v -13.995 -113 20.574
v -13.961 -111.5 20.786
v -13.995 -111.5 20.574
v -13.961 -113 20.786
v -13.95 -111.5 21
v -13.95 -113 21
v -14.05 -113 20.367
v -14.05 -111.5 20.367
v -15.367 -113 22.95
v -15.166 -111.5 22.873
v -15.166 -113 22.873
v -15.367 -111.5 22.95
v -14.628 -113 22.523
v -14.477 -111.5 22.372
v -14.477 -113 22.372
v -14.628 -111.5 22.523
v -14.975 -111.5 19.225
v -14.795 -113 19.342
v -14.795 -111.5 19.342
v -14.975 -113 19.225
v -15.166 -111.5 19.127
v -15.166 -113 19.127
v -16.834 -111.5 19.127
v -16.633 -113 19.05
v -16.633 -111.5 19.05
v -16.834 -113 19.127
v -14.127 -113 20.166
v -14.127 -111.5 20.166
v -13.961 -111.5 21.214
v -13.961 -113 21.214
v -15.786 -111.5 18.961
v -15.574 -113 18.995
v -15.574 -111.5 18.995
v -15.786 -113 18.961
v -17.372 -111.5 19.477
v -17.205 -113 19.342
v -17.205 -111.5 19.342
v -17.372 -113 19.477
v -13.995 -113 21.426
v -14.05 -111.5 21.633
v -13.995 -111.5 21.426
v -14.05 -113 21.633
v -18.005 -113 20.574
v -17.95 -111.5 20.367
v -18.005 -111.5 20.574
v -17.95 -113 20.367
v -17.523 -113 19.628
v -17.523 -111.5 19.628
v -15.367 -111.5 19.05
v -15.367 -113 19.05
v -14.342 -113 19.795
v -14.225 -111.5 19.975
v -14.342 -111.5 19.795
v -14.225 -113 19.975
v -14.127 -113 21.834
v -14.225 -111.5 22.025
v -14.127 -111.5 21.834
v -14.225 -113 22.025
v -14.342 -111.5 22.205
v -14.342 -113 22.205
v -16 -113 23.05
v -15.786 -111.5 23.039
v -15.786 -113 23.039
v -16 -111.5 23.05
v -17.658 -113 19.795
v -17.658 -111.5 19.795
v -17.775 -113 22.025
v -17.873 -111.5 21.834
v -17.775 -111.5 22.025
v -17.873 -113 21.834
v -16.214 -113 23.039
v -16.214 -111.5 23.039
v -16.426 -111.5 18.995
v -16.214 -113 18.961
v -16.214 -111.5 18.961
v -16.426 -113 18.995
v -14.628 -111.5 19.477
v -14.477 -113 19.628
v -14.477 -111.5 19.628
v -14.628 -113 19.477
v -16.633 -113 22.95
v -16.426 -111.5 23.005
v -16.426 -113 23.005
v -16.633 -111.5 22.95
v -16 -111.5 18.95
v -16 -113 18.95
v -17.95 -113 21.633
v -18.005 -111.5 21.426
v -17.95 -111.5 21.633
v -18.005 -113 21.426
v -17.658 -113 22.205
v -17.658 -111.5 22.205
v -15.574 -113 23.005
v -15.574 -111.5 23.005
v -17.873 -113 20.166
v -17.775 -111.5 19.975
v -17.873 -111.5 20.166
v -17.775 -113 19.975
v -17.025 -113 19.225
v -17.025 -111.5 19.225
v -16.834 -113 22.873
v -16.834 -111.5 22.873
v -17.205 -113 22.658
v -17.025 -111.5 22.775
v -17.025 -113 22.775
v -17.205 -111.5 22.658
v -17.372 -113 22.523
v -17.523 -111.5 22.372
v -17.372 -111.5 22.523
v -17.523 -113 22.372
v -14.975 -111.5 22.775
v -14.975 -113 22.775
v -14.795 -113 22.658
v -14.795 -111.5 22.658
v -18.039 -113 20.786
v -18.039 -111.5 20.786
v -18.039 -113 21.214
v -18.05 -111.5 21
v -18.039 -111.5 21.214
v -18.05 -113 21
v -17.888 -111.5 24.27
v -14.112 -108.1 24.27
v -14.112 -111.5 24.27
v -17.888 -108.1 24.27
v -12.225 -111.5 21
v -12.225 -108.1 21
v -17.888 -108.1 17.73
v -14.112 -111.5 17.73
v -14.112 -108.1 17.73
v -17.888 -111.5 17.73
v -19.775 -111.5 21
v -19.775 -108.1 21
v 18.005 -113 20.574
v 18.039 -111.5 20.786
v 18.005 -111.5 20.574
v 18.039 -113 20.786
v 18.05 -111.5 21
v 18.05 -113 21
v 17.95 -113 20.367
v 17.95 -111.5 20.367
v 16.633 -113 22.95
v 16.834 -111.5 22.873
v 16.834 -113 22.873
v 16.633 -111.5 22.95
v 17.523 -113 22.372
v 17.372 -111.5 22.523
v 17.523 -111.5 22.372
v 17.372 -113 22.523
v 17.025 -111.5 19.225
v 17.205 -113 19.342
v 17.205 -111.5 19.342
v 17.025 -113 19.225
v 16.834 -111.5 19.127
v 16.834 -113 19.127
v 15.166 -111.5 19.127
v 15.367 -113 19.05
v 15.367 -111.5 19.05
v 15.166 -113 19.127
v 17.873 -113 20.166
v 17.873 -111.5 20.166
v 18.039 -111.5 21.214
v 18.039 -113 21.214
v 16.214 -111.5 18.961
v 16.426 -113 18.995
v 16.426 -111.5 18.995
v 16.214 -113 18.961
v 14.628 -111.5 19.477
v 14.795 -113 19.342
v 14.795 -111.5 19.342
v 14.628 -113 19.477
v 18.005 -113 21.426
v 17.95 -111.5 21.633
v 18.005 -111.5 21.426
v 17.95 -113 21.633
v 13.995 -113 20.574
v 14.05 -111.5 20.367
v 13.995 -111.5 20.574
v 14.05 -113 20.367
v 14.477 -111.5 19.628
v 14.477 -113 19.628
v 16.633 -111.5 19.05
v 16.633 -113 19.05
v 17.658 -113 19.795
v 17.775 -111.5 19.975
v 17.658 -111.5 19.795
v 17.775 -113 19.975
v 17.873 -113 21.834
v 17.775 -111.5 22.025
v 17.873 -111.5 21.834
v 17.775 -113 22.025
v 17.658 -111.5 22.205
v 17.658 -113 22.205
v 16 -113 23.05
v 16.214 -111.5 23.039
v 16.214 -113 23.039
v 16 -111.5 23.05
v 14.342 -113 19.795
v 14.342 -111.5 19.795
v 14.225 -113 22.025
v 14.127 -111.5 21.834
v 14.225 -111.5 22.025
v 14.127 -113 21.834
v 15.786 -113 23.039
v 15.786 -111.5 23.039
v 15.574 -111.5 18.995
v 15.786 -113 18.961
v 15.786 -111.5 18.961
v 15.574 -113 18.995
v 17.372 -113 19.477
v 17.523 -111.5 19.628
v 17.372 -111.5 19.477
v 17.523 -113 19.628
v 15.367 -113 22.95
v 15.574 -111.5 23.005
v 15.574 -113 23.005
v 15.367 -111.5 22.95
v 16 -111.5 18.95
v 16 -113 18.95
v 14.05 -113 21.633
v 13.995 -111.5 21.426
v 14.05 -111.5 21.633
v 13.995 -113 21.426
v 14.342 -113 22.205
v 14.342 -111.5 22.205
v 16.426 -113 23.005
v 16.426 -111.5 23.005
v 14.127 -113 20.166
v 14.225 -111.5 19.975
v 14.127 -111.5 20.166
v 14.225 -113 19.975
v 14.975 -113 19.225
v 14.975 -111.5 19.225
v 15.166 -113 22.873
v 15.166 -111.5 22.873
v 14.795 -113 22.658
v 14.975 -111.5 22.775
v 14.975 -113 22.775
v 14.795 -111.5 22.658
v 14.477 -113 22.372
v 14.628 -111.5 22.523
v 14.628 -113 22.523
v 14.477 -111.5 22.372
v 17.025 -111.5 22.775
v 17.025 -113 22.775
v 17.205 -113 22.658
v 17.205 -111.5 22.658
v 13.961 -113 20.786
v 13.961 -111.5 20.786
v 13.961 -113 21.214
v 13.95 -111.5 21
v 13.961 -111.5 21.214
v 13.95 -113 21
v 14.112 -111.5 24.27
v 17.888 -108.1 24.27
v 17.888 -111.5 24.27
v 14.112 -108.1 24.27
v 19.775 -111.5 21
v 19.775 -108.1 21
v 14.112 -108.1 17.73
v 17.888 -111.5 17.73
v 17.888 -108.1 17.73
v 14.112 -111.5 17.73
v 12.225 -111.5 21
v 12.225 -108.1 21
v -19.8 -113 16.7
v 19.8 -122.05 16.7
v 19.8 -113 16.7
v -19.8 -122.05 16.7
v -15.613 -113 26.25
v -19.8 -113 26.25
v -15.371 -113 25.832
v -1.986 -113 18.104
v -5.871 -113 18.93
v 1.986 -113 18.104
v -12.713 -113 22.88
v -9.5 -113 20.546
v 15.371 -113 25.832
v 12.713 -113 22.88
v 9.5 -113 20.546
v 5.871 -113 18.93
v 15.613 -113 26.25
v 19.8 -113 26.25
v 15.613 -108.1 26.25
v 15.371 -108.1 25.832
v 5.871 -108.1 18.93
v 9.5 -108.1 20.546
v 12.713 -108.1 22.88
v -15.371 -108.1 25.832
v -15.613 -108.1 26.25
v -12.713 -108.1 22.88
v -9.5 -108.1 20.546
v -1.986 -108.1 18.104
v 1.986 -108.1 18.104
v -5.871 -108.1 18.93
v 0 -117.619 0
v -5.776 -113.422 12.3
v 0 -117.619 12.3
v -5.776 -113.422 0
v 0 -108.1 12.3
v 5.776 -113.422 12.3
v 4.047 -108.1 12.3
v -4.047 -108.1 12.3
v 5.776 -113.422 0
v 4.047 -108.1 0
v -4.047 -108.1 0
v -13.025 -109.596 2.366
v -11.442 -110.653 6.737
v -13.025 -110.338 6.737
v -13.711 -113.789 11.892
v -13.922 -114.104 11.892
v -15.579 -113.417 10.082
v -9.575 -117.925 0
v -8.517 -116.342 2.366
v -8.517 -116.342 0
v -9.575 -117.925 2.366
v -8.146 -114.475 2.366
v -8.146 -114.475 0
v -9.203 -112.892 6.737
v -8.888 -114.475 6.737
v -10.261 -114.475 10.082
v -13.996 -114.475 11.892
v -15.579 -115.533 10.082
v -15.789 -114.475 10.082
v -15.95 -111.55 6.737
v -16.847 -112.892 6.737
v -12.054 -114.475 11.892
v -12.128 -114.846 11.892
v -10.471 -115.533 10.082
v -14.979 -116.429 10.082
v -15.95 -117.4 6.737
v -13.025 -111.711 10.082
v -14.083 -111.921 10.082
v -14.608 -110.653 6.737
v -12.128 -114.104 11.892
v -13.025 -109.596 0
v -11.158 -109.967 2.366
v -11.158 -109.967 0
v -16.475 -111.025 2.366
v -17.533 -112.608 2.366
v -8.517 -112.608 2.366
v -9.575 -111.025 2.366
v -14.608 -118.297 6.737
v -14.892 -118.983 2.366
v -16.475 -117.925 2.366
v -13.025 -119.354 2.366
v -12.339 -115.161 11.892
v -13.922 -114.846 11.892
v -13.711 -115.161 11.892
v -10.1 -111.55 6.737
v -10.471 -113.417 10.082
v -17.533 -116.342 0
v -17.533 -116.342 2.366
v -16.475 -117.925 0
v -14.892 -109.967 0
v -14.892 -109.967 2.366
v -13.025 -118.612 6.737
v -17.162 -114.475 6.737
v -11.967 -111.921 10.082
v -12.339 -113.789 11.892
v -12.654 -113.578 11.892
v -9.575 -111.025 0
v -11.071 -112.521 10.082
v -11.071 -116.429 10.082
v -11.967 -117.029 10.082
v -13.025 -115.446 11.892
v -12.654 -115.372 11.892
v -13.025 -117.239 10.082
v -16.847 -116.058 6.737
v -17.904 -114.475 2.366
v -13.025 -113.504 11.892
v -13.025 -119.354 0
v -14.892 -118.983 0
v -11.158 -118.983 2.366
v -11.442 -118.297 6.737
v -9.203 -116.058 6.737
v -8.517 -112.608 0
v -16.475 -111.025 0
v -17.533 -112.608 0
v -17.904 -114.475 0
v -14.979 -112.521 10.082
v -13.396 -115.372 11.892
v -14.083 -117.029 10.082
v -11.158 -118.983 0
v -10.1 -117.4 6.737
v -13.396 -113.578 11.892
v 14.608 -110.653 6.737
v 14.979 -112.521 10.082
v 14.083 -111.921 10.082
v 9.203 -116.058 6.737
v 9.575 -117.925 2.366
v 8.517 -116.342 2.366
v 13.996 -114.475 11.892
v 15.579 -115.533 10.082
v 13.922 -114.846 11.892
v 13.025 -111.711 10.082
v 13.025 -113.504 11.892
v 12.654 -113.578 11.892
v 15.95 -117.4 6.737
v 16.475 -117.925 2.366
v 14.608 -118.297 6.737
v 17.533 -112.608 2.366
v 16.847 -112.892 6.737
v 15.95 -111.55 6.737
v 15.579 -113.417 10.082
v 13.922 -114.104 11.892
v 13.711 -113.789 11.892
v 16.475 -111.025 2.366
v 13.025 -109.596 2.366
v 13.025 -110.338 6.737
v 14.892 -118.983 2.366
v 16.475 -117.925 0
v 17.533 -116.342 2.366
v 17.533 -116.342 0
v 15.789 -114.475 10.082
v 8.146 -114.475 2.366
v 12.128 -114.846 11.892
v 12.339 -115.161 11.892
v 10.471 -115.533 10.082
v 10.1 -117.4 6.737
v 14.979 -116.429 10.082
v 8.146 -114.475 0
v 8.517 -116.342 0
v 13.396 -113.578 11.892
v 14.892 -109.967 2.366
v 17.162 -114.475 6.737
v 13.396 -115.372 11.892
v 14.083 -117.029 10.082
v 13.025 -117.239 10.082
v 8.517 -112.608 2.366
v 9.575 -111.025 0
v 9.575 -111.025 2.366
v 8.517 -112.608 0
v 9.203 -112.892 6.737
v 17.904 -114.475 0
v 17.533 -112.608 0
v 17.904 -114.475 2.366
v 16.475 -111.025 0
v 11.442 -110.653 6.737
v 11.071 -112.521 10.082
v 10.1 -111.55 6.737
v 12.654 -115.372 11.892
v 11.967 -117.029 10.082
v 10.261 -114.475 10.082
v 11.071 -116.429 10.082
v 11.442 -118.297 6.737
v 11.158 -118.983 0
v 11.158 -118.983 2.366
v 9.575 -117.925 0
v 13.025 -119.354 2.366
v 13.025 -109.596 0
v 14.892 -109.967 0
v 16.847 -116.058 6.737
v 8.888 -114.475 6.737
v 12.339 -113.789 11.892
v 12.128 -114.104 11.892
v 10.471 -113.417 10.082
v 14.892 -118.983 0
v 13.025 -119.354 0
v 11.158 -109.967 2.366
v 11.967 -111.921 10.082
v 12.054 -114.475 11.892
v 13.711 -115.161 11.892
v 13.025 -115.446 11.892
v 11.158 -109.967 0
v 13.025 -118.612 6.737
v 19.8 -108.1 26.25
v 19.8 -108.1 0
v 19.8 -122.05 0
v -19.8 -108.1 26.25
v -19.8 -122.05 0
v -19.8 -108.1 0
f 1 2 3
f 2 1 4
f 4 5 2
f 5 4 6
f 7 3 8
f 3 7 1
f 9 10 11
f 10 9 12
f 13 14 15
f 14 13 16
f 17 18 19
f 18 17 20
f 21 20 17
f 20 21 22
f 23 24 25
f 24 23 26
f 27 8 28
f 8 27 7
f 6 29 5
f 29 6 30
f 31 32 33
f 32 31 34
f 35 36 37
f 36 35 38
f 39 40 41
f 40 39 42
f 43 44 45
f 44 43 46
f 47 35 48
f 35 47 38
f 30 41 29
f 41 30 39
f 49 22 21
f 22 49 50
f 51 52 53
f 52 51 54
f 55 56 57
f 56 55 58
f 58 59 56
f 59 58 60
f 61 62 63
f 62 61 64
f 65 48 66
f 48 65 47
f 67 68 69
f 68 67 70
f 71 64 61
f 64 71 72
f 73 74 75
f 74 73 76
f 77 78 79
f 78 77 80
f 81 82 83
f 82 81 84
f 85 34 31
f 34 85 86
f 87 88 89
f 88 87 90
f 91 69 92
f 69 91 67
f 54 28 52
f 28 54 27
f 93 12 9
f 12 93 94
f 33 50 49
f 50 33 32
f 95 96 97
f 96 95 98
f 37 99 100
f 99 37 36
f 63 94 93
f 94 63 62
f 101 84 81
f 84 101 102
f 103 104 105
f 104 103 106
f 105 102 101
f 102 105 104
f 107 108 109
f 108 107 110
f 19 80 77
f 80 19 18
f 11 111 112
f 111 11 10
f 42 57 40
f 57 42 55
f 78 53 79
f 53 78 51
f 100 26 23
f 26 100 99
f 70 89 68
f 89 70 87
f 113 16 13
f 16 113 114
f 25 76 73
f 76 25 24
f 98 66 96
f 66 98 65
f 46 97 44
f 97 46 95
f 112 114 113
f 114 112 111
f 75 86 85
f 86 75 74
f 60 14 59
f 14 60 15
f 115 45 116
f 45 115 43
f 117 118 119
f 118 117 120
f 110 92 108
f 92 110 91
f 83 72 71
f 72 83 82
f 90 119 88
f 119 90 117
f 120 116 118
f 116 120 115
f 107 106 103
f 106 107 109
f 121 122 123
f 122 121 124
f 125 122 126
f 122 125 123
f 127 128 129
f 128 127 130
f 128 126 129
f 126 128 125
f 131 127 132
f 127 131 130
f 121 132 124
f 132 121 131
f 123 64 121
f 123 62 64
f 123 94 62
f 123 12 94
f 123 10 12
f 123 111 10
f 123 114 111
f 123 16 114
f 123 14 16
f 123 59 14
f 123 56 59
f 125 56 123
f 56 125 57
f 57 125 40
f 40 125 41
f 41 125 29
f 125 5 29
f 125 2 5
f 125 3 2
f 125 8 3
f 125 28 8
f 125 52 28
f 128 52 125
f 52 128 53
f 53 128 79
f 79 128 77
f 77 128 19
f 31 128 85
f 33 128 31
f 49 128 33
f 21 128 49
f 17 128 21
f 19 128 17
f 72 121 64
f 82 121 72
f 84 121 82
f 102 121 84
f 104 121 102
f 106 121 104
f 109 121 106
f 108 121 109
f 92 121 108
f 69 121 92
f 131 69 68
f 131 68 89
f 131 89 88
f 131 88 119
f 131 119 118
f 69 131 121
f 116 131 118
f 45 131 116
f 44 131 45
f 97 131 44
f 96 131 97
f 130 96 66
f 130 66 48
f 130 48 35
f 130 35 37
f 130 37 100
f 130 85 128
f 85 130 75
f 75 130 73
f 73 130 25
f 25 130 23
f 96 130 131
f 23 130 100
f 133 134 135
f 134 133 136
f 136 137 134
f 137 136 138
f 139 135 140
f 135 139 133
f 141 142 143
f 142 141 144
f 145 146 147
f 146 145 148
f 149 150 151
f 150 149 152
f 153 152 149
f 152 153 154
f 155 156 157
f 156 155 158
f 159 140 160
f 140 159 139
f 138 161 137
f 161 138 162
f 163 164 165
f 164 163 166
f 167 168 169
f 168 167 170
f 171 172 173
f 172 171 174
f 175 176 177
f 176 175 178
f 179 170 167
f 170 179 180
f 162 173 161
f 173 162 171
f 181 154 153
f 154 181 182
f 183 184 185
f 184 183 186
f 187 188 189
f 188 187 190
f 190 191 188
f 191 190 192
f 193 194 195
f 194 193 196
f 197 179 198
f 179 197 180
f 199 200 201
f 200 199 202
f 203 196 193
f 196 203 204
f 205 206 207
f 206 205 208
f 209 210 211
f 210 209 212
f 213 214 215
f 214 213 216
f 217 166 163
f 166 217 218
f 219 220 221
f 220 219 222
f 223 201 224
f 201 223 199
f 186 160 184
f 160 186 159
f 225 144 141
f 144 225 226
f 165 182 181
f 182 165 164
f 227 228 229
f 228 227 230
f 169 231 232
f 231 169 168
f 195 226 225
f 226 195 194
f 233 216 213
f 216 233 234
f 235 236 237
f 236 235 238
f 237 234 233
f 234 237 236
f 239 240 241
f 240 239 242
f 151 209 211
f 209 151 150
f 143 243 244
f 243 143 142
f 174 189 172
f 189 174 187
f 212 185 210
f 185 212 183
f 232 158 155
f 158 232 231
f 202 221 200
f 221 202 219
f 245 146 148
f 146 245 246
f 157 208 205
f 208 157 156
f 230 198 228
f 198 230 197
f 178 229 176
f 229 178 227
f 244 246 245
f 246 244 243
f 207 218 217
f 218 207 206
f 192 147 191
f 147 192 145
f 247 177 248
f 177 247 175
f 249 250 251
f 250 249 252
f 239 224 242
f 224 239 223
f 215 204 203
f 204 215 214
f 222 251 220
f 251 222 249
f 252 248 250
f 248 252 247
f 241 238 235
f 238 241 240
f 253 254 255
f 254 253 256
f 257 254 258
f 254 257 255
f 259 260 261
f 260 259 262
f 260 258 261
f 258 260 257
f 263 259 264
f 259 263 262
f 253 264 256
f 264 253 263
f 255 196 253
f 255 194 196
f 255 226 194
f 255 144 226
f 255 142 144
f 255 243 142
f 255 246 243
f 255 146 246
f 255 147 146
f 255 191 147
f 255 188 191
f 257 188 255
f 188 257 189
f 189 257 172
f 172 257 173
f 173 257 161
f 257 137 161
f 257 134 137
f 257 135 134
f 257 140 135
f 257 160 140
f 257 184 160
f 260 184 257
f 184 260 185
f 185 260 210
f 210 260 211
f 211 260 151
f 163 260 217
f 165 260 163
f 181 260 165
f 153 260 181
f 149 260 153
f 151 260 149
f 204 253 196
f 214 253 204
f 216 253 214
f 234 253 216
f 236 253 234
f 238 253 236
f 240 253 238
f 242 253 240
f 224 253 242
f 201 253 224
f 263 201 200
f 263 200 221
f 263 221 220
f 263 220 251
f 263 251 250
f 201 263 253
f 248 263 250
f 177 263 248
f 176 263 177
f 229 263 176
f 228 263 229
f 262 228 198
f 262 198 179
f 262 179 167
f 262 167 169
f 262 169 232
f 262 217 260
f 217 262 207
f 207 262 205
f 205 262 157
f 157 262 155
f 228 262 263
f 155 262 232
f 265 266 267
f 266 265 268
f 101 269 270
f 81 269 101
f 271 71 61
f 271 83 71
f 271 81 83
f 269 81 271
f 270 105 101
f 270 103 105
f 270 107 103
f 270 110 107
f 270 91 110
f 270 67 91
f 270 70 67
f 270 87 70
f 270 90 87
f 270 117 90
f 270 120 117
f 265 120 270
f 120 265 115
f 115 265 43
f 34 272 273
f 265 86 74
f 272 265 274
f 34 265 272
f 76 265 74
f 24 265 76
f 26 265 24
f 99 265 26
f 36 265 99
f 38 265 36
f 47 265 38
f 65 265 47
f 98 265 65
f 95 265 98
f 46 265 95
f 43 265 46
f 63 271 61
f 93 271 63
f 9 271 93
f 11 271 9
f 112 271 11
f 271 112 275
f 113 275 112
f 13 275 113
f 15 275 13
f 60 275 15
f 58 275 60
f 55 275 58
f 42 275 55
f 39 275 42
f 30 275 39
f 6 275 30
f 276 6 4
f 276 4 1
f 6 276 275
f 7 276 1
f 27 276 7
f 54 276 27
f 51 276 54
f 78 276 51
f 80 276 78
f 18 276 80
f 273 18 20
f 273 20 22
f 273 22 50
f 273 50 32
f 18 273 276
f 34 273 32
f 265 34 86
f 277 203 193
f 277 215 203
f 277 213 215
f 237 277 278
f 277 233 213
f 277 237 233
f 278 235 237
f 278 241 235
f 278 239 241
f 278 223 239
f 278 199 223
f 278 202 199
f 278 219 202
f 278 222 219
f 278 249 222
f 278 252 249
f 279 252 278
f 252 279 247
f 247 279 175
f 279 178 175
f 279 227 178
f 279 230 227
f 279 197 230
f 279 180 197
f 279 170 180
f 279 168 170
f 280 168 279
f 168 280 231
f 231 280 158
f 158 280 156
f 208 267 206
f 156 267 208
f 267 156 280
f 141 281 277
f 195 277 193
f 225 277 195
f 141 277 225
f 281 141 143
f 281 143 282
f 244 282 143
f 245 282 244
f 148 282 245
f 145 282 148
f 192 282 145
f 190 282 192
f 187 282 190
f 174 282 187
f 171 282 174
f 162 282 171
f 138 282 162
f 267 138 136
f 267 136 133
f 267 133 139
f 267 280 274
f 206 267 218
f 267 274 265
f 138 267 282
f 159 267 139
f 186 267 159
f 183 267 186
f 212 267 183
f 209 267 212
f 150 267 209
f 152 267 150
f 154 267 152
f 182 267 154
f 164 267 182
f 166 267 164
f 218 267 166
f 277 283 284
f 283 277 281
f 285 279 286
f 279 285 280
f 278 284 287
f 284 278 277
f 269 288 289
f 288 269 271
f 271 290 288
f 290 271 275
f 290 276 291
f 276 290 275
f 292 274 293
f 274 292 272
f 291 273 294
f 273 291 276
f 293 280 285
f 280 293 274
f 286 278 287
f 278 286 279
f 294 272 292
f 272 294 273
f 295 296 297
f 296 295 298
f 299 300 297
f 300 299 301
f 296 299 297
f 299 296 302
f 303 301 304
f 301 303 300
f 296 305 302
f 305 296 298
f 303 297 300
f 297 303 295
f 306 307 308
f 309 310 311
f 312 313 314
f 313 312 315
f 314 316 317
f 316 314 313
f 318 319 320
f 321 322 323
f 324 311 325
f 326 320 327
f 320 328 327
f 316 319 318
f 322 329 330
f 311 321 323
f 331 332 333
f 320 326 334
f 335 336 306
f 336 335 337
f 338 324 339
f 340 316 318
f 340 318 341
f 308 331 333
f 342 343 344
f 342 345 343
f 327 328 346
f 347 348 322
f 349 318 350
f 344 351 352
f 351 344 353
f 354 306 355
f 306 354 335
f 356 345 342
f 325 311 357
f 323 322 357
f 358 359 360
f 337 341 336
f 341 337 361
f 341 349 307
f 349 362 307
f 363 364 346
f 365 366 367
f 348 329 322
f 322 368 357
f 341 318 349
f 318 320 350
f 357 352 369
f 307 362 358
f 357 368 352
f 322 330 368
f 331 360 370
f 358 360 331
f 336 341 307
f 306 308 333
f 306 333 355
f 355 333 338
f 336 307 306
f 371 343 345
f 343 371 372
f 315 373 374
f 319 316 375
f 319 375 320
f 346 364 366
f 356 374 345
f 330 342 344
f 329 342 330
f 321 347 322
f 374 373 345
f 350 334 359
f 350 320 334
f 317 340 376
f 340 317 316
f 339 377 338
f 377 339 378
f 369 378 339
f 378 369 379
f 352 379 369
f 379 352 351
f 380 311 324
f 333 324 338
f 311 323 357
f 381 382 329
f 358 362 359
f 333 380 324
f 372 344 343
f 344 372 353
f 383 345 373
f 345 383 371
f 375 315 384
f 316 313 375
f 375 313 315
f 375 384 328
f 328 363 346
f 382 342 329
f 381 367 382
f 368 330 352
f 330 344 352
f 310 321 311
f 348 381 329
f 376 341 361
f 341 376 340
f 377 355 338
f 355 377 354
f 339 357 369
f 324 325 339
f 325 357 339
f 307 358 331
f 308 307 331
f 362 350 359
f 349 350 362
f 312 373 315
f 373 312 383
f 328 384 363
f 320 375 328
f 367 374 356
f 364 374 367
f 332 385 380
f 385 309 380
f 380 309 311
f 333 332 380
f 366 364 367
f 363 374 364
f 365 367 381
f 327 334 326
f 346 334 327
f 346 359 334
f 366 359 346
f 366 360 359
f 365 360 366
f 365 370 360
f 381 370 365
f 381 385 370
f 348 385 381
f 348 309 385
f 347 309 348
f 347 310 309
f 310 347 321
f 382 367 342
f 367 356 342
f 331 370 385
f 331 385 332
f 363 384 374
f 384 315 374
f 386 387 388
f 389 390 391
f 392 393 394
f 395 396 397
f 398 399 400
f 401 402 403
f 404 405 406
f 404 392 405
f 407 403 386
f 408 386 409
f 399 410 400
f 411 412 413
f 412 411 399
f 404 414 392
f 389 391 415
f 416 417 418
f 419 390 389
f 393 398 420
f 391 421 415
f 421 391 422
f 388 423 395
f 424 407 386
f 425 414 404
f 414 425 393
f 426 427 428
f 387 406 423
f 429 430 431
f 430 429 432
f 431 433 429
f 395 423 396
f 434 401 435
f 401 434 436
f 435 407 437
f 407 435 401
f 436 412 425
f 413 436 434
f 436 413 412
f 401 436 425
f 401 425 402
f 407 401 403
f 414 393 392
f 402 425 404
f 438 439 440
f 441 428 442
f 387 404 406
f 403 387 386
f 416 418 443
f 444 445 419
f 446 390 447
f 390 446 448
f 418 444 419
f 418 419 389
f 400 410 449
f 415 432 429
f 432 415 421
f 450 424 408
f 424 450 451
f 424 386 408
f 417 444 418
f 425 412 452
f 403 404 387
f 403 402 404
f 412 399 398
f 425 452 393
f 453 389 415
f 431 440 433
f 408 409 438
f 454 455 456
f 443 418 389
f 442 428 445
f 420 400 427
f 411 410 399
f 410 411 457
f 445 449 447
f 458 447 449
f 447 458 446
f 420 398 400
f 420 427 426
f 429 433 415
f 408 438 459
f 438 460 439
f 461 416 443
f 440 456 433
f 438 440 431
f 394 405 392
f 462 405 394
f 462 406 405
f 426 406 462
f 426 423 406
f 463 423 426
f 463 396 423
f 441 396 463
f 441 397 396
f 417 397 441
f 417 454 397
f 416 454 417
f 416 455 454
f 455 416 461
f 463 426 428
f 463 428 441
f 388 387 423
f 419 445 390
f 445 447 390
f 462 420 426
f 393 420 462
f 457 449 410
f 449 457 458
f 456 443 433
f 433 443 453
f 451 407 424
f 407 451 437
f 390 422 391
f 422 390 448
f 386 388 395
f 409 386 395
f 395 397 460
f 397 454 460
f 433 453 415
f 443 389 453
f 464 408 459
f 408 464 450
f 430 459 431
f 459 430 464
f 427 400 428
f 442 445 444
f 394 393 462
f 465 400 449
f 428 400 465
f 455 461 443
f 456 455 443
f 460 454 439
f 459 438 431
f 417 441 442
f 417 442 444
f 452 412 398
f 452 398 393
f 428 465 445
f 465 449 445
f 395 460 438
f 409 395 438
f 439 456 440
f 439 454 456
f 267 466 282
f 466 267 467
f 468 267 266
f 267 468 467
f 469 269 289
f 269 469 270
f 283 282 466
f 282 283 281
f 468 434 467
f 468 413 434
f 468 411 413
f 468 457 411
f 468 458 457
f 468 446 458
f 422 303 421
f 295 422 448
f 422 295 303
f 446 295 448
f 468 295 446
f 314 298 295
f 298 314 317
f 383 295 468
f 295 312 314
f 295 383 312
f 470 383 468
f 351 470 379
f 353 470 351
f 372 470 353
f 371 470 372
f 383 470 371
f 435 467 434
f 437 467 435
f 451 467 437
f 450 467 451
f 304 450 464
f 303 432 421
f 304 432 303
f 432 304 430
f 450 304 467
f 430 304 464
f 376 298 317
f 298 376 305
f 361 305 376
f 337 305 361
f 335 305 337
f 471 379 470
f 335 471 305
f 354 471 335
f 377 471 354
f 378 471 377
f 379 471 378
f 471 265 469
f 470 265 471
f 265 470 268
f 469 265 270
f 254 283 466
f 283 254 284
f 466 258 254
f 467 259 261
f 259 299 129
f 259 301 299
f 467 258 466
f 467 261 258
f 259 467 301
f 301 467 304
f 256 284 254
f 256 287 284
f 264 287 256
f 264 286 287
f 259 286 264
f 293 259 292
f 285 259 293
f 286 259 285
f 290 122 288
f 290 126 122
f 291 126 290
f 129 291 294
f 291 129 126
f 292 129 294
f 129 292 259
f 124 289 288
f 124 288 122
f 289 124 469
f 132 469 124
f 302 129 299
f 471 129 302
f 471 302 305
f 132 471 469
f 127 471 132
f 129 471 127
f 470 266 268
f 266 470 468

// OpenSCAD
//
// Copyright (C) 2016, Jason S. McMullan <jason.mcmullan@gmail.com>
// All rights reserved.
//
// Licensed under the MIT License:
//
// Permission is hereby granted, free of charge, to any person obtaining
// a copy of this software and associated documentation files (the "Software"),
// to deal in the Software without restriction, including without limitation
// the rights to use, copy, modify, merge, publish, distribute, sublicense,
// and/or sell copies of the Software, and to permit persons to whom the
// Software is furnished to do so, subject to the following conditions:
//
// The above copyright notice and this permission notice shall be included
// in all copies or substantial portions of the Software.
//
// THE SOFTWARE IS PROVIDED "AS IS", WITHOUT WARRANTY OF ANY KIND, EXPRESS OR
// IMPLIED, INCLUDING BUT NOT LIMITED TO THE WARRANTIES OF MERCHANTABILITY,
// FITNESS FOR A PARTICULAR PURPOSE AND NONINFRINGEMENT. IN NO EVENT SHALL THE
// AUTHORS OR COPYRIGHT HOLDERS BE LIABLE FOR ANY CLAIM, DAMAGES OR OTHER
// LIABILITY, WHETHER IN AN ACTION OF CONTRACT, TORT OR OTHERWISE, ARISING
// FROM, OUT OF OR IN CONNECTION WITH THE SOFTWARE OR THE USE OR OTHER
// DEALINGS IN THE SOFTWARE.
//
// All units are in mm

// Bed Diameter
bed_diameter = 215;

// Standoff height
bed_standoff_height = 10;
bed_total_height = 17;


// Screw diameter
bed_screw_diameter = 3.5;
bed_screw_inset = -5;

// Fan size
fan_size = 40;
fan_depth = 11;

// Fan screw 
fan_screw_diameter = 3.5;
fan_screw_inset = [-4, -4 ];
fan_screw_length = 50;
fan_nut_face = 5.5;
fan_nut_head = 5;
fan_nut_wall = 1.5;

// Clip face
clip_face = 10;

// Tolerance
tolerance = 0.3;

fn = 30;

module fan_void_bolt()
{
    rotate([-90, 0, 0]) {
        cylinder(d = fan_screw_diameter + tolerance*2, h = fan_screw_length, $fn = 60);
        translate([0, 0, fan_screw_length/2 - fan_nut_head - fan_nut_wall])
            cylinder(r = fan_nut_face/sqrt(3) + tolerance*2, h = fan_nut_head, $fn = 6);
        translate([0, 0, fan_screw_length/2 + fan_depth + fan_nut_head + fan_nut_wall])
            cylinder(r = fan_nut_face/sqrt(3) + tolerance*2, h = fan_nut_head, $fn = 6);
    }
}
        

module fan_void()
{ 
    translate([-fan_size/2 - tolerance, 0, -tolerance])
        cube([fan_size+tolerance*2, fan_depth + 5, fan_size + tolerance*2]);
    
    translate([0, -fan_screw_length/2, fan_size/2])
        rotate([-90, 0, 0]) cylinder(r = fan_size/2 - 1, h = fan_screw_length);
    
    translate([-fan_size/2 - fan_screw_inset[0], -fan_screw_length/2, -fan_screw_inset[1]])
        fan_void_bolt();
    translate([-fan_size/2 - fan_screw_inset[0], -fan_screw_length/2, fan_size + fan_screw_inset[1]])
        fan_void_bolt();
    translate([fan_size/2 + fan_screw_inset[0], -fan_screw_length/2, -fan_screw_inset[1]])
        fan_void_bolt();
    translate([fan_size/2 + fan_screw_inset[0], - fan_screw_length/2, fan_size + fan_screw_inset[1]])
        fan_void_bolt();
}

module bed_standoff(chuck_height = 2, cutout = false)
{ 
    difference() {
        union() {
            translate([0, -bed_diameter/2 - bed_screw_inset, 0])
                cylinder(d = bed_screw_diameter*2, h = bed_standoff_height, $fn = fn);
            translate([0, -bed_diameter/2 - clip_face/2*cos(36), 0]) {
                translate([0, 0, (cutout ? -tolerance: 0)]) rotate([0, 0, -18])
                    cylinder(r = clip_face/sqrt(3) + (cutout ? tolerance : 0), h = bed_standoff_height + chuck_height + (cutout ? tolerance*2 : 0), $fn = 5);
            translate([-clip_face/sqrt(3)/2, -clip_face/3, 0])
                cube([clip_face/sqrt(3), -bed_screw_inset + bed_screw_diameter + clip_face/3, bed_standoff_height + chuck_height]);
            }        
        }
        translate([0, -bed_diameter/2 - bed_screw_inset, -0.01])
                cylinder(d = bed_screw_diameter + tolerance*2, h = bed_standoff_height + chuck_height + 0.02, $fn = fn);
        translate([0, 0, bed_standoff_height - 0.01 + (cutout ? tolerance : 0)])
            cylinder(d = bed_diameter + tolerance*4, h = bed_total_height, $fn = fn*2);
    }
}

module fan_bed_clip()
{
    width =  tolerance + fan_depth - bed_screw_inset - bed_screw_diameter/2 - tolerance*2;
    
    difference() {
        translate([-fan_size*0.99/2, -bed_diameter/2 - width - tolerance*2, 0])
            cube([fan_size * 0.99, width, bed_total_height -fan_screw_inset[1] + fan_screw_diameter/2*3]);
                   
        translate([0, -bed_diameter/2 - fan_nut_wall - fan_size/2, bed_total_height])
            fan_void();
        
       bed_standoff(cutout = true);
        
       translate([0, -bed_diameter/2 - width/2, 0]) 
        scale([1, 1, bed_total_height/(width/2)]) {
                translate([-fan_size/2 + width/2, 0,  0]) sphere(r = width/2 - 2);
                translate([fan_size/2 - width/2, 0, 0]) sphere(r = width/2 - 2);
        }
        
    }
}

fan_bed_clip();

// vim: set shiftwidth=4 expandtab: //
